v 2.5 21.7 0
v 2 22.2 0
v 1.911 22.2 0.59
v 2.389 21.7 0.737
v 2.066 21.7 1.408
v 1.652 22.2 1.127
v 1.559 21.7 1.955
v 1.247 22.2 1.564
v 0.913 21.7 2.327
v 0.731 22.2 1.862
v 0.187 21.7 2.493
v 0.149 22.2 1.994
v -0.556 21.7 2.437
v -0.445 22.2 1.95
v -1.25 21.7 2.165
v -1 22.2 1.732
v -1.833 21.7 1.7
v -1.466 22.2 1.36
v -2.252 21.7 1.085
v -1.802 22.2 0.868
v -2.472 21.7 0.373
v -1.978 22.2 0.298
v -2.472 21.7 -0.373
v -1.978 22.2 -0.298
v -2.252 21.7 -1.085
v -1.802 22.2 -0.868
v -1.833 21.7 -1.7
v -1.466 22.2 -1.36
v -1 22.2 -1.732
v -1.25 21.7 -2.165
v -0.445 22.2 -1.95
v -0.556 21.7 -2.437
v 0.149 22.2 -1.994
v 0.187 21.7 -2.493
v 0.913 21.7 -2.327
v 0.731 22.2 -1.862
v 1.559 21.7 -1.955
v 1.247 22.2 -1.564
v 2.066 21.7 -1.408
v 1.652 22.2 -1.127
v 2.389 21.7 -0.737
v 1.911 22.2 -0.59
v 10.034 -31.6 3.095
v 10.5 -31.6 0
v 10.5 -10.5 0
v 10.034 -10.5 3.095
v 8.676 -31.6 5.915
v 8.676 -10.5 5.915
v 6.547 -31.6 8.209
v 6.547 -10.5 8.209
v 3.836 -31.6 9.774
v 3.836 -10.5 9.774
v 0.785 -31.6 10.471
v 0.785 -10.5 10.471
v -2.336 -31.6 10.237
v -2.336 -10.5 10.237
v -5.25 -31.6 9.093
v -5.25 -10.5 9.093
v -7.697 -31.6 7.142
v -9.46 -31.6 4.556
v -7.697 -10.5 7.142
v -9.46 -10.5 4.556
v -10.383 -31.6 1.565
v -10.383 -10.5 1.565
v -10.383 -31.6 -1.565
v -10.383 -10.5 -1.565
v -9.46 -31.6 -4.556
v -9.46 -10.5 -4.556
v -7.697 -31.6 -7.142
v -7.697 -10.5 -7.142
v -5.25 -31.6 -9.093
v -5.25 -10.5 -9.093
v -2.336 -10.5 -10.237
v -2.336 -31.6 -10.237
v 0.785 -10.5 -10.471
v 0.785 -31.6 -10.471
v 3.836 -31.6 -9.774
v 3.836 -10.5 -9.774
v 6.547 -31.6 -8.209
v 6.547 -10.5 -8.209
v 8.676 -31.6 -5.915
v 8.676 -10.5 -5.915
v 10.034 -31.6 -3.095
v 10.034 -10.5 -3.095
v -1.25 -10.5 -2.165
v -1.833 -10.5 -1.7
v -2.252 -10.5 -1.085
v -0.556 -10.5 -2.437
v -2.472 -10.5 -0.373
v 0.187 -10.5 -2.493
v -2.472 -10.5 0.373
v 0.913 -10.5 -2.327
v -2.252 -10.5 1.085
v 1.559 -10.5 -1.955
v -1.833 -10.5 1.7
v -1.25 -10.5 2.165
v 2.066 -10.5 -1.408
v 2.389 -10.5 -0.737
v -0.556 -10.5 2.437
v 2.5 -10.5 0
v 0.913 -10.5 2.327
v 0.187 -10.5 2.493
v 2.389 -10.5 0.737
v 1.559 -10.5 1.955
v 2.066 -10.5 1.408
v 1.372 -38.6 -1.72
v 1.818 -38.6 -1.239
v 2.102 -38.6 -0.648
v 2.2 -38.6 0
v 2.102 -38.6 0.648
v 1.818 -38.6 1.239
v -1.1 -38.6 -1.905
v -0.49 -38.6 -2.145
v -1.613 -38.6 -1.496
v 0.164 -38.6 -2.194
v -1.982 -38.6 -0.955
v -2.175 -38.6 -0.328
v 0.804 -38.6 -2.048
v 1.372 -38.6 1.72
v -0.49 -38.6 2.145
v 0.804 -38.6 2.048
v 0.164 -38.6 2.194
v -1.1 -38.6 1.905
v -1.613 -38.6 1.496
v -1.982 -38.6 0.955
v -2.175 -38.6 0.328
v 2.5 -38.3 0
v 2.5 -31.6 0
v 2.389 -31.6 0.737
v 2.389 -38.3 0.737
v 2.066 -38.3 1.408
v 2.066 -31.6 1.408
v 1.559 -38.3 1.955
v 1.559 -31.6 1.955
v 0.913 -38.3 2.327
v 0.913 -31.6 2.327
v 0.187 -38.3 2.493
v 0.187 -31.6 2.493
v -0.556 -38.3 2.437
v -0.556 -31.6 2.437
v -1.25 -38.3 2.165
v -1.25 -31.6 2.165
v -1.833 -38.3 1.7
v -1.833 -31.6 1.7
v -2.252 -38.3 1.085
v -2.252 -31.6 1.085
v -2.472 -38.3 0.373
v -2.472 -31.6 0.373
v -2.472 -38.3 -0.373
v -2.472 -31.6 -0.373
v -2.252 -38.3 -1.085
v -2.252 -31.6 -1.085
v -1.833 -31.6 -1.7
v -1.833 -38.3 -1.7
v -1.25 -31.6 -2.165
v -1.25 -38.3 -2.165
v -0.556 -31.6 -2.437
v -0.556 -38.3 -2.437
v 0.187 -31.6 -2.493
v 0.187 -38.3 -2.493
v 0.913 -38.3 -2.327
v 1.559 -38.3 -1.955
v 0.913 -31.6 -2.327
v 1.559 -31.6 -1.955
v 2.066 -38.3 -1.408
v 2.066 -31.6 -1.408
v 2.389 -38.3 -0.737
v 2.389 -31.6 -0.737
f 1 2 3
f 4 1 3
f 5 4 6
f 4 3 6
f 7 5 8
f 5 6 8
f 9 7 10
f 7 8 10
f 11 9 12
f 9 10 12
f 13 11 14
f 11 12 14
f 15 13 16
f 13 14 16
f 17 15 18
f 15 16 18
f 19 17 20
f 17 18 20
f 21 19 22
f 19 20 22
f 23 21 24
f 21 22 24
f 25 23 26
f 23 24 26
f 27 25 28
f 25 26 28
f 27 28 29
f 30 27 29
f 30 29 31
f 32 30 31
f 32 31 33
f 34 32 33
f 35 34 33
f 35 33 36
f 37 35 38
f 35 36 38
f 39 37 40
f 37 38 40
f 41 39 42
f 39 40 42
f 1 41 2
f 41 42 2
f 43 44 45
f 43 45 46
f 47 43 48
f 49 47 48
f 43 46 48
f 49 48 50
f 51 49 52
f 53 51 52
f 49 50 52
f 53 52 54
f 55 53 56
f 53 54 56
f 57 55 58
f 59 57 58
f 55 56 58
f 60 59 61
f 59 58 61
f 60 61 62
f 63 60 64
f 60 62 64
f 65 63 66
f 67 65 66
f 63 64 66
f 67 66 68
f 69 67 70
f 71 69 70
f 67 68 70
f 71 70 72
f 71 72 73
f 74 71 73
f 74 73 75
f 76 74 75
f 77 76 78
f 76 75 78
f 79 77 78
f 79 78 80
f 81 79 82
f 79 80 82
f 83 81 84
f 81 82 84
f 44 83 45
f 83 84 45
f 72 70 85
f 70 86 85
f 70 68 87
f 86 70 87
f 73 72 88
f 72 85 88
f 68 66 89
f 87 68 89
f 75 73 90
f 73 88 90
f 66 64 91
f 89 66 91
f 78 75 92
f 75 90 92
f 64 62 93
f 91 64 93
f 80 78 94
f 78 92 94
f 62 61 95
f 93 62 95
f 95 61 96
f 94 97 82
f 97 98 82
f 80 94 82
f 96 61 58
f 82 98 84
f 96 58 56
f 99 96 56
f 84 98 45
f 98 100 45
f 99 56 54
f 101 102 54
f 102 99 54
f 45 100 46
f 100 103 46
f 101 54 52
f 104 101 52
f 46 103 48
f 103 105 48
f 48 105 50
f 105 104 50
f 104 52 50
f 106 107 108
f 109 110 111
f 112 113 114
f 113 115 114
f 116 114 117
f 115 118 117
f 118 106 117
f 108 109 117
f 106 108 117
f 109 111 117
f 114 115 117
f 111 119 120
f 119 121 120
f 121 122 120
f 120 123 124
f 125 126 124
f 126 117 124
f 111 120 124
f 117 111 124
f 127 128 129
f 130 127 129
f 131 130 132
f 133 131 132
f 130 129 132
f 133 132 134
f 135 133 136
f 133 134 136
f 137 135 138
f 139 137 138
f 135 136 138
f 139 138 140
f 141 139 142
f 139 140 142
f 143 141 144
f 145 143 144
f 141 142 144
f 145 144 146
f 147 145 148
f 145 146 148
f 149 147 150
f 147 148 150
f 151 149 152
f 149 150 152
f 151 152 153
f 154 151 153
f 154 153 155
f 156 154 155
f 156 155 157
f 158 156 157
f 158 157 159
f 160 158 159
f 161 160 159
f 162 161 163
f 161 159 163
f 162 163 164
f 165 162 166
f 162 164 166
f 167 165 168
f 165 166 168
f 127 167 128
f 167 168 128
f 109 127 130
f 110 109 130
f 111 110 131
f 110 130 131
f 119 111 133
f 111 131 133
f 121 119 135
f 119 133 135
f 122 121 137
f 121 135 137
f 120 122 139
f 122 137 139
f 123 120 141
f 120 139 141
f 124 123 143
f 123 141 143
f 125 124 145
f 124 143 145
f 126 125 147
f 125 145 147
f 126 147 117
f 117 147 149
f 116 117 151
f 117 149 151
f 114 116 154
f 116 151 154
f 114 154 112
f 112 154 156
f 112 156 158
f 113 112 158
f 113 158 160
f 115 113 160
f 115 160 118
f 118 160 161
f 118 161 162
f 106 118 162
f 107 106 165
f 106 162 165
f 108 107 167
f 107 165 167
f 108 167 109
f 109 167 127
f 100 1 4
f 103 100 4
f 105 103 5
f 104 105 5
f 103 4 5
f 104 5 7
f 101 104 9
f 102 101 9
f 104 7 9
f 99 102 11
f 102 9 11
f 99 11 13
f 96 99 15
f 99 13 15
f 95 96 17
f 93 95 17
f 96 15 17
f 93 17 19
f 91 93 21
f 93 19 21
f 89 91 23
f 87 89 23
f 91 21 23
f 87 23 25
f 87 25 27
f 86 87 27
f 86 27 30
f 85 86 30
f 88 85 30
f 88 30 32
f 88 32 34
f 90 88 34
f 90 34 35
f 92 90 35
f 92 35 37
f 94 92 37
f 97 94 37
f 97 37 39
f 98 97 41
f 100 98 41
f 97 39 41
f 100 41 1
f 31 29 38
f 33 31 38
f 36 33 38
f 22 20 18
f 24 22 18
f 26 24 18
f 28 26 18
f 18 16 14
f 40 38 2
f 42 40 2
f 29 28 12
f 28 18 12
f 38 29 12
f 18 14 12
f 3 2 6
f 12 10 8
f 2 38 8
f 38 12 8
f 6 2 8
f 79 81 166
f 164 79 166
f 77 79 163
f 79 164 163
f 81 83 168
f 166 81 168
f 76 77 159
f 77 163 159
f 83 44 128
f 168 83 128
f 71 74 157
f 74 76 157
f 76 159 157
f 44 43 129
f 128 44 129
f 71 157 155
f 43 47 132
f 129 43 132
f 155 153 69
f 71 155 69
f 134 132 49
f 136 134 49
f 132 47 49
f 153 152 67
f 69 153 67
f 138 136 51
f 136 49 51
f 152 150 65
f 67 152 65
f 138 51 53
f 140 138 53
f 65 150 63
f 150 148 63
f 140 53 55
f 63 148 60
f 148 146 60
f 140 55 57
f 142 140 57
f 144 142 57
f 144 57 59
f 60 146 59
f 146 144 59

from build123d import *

# Parameters (mm, degrees)
CHAMFER1_SIZE = 0.3
CHAMFER2_SIZE = 0.5


with BuildPart() as part:
    # Sketch1 → Revolve1 (revolve)
    with BuildSketch(Plane.XY):
        Polygon((0, -38.6), (2.5, -38.6), (2.5, -31.6), (10.5, -31.6), (10.5, -10.5), (2.5, -10.5), (2.5, 22.2), (0, 22.2), align=None)
    revolve(axis=Axis((0, 22.2, 0), (0, -1, 0)))

    # Chamfer1
    chamfer1_edges = [part.edges().sort_by_distance(p)[0] for p in [
        (-2.5, -38.6, 0),
    ]]
    chamfer(chamfer1_edges, length=CHAMFER1_SIZE)

    # Chamfer2
    chamfer2_edges = [part.edges().sort_by_distance(p)[0] for p in [
        (-2.5, 22.2, 0),
    ]]
    chamfer(chamfer2_edges, length=CHAMFER2_SIZE)


solid = part.part
